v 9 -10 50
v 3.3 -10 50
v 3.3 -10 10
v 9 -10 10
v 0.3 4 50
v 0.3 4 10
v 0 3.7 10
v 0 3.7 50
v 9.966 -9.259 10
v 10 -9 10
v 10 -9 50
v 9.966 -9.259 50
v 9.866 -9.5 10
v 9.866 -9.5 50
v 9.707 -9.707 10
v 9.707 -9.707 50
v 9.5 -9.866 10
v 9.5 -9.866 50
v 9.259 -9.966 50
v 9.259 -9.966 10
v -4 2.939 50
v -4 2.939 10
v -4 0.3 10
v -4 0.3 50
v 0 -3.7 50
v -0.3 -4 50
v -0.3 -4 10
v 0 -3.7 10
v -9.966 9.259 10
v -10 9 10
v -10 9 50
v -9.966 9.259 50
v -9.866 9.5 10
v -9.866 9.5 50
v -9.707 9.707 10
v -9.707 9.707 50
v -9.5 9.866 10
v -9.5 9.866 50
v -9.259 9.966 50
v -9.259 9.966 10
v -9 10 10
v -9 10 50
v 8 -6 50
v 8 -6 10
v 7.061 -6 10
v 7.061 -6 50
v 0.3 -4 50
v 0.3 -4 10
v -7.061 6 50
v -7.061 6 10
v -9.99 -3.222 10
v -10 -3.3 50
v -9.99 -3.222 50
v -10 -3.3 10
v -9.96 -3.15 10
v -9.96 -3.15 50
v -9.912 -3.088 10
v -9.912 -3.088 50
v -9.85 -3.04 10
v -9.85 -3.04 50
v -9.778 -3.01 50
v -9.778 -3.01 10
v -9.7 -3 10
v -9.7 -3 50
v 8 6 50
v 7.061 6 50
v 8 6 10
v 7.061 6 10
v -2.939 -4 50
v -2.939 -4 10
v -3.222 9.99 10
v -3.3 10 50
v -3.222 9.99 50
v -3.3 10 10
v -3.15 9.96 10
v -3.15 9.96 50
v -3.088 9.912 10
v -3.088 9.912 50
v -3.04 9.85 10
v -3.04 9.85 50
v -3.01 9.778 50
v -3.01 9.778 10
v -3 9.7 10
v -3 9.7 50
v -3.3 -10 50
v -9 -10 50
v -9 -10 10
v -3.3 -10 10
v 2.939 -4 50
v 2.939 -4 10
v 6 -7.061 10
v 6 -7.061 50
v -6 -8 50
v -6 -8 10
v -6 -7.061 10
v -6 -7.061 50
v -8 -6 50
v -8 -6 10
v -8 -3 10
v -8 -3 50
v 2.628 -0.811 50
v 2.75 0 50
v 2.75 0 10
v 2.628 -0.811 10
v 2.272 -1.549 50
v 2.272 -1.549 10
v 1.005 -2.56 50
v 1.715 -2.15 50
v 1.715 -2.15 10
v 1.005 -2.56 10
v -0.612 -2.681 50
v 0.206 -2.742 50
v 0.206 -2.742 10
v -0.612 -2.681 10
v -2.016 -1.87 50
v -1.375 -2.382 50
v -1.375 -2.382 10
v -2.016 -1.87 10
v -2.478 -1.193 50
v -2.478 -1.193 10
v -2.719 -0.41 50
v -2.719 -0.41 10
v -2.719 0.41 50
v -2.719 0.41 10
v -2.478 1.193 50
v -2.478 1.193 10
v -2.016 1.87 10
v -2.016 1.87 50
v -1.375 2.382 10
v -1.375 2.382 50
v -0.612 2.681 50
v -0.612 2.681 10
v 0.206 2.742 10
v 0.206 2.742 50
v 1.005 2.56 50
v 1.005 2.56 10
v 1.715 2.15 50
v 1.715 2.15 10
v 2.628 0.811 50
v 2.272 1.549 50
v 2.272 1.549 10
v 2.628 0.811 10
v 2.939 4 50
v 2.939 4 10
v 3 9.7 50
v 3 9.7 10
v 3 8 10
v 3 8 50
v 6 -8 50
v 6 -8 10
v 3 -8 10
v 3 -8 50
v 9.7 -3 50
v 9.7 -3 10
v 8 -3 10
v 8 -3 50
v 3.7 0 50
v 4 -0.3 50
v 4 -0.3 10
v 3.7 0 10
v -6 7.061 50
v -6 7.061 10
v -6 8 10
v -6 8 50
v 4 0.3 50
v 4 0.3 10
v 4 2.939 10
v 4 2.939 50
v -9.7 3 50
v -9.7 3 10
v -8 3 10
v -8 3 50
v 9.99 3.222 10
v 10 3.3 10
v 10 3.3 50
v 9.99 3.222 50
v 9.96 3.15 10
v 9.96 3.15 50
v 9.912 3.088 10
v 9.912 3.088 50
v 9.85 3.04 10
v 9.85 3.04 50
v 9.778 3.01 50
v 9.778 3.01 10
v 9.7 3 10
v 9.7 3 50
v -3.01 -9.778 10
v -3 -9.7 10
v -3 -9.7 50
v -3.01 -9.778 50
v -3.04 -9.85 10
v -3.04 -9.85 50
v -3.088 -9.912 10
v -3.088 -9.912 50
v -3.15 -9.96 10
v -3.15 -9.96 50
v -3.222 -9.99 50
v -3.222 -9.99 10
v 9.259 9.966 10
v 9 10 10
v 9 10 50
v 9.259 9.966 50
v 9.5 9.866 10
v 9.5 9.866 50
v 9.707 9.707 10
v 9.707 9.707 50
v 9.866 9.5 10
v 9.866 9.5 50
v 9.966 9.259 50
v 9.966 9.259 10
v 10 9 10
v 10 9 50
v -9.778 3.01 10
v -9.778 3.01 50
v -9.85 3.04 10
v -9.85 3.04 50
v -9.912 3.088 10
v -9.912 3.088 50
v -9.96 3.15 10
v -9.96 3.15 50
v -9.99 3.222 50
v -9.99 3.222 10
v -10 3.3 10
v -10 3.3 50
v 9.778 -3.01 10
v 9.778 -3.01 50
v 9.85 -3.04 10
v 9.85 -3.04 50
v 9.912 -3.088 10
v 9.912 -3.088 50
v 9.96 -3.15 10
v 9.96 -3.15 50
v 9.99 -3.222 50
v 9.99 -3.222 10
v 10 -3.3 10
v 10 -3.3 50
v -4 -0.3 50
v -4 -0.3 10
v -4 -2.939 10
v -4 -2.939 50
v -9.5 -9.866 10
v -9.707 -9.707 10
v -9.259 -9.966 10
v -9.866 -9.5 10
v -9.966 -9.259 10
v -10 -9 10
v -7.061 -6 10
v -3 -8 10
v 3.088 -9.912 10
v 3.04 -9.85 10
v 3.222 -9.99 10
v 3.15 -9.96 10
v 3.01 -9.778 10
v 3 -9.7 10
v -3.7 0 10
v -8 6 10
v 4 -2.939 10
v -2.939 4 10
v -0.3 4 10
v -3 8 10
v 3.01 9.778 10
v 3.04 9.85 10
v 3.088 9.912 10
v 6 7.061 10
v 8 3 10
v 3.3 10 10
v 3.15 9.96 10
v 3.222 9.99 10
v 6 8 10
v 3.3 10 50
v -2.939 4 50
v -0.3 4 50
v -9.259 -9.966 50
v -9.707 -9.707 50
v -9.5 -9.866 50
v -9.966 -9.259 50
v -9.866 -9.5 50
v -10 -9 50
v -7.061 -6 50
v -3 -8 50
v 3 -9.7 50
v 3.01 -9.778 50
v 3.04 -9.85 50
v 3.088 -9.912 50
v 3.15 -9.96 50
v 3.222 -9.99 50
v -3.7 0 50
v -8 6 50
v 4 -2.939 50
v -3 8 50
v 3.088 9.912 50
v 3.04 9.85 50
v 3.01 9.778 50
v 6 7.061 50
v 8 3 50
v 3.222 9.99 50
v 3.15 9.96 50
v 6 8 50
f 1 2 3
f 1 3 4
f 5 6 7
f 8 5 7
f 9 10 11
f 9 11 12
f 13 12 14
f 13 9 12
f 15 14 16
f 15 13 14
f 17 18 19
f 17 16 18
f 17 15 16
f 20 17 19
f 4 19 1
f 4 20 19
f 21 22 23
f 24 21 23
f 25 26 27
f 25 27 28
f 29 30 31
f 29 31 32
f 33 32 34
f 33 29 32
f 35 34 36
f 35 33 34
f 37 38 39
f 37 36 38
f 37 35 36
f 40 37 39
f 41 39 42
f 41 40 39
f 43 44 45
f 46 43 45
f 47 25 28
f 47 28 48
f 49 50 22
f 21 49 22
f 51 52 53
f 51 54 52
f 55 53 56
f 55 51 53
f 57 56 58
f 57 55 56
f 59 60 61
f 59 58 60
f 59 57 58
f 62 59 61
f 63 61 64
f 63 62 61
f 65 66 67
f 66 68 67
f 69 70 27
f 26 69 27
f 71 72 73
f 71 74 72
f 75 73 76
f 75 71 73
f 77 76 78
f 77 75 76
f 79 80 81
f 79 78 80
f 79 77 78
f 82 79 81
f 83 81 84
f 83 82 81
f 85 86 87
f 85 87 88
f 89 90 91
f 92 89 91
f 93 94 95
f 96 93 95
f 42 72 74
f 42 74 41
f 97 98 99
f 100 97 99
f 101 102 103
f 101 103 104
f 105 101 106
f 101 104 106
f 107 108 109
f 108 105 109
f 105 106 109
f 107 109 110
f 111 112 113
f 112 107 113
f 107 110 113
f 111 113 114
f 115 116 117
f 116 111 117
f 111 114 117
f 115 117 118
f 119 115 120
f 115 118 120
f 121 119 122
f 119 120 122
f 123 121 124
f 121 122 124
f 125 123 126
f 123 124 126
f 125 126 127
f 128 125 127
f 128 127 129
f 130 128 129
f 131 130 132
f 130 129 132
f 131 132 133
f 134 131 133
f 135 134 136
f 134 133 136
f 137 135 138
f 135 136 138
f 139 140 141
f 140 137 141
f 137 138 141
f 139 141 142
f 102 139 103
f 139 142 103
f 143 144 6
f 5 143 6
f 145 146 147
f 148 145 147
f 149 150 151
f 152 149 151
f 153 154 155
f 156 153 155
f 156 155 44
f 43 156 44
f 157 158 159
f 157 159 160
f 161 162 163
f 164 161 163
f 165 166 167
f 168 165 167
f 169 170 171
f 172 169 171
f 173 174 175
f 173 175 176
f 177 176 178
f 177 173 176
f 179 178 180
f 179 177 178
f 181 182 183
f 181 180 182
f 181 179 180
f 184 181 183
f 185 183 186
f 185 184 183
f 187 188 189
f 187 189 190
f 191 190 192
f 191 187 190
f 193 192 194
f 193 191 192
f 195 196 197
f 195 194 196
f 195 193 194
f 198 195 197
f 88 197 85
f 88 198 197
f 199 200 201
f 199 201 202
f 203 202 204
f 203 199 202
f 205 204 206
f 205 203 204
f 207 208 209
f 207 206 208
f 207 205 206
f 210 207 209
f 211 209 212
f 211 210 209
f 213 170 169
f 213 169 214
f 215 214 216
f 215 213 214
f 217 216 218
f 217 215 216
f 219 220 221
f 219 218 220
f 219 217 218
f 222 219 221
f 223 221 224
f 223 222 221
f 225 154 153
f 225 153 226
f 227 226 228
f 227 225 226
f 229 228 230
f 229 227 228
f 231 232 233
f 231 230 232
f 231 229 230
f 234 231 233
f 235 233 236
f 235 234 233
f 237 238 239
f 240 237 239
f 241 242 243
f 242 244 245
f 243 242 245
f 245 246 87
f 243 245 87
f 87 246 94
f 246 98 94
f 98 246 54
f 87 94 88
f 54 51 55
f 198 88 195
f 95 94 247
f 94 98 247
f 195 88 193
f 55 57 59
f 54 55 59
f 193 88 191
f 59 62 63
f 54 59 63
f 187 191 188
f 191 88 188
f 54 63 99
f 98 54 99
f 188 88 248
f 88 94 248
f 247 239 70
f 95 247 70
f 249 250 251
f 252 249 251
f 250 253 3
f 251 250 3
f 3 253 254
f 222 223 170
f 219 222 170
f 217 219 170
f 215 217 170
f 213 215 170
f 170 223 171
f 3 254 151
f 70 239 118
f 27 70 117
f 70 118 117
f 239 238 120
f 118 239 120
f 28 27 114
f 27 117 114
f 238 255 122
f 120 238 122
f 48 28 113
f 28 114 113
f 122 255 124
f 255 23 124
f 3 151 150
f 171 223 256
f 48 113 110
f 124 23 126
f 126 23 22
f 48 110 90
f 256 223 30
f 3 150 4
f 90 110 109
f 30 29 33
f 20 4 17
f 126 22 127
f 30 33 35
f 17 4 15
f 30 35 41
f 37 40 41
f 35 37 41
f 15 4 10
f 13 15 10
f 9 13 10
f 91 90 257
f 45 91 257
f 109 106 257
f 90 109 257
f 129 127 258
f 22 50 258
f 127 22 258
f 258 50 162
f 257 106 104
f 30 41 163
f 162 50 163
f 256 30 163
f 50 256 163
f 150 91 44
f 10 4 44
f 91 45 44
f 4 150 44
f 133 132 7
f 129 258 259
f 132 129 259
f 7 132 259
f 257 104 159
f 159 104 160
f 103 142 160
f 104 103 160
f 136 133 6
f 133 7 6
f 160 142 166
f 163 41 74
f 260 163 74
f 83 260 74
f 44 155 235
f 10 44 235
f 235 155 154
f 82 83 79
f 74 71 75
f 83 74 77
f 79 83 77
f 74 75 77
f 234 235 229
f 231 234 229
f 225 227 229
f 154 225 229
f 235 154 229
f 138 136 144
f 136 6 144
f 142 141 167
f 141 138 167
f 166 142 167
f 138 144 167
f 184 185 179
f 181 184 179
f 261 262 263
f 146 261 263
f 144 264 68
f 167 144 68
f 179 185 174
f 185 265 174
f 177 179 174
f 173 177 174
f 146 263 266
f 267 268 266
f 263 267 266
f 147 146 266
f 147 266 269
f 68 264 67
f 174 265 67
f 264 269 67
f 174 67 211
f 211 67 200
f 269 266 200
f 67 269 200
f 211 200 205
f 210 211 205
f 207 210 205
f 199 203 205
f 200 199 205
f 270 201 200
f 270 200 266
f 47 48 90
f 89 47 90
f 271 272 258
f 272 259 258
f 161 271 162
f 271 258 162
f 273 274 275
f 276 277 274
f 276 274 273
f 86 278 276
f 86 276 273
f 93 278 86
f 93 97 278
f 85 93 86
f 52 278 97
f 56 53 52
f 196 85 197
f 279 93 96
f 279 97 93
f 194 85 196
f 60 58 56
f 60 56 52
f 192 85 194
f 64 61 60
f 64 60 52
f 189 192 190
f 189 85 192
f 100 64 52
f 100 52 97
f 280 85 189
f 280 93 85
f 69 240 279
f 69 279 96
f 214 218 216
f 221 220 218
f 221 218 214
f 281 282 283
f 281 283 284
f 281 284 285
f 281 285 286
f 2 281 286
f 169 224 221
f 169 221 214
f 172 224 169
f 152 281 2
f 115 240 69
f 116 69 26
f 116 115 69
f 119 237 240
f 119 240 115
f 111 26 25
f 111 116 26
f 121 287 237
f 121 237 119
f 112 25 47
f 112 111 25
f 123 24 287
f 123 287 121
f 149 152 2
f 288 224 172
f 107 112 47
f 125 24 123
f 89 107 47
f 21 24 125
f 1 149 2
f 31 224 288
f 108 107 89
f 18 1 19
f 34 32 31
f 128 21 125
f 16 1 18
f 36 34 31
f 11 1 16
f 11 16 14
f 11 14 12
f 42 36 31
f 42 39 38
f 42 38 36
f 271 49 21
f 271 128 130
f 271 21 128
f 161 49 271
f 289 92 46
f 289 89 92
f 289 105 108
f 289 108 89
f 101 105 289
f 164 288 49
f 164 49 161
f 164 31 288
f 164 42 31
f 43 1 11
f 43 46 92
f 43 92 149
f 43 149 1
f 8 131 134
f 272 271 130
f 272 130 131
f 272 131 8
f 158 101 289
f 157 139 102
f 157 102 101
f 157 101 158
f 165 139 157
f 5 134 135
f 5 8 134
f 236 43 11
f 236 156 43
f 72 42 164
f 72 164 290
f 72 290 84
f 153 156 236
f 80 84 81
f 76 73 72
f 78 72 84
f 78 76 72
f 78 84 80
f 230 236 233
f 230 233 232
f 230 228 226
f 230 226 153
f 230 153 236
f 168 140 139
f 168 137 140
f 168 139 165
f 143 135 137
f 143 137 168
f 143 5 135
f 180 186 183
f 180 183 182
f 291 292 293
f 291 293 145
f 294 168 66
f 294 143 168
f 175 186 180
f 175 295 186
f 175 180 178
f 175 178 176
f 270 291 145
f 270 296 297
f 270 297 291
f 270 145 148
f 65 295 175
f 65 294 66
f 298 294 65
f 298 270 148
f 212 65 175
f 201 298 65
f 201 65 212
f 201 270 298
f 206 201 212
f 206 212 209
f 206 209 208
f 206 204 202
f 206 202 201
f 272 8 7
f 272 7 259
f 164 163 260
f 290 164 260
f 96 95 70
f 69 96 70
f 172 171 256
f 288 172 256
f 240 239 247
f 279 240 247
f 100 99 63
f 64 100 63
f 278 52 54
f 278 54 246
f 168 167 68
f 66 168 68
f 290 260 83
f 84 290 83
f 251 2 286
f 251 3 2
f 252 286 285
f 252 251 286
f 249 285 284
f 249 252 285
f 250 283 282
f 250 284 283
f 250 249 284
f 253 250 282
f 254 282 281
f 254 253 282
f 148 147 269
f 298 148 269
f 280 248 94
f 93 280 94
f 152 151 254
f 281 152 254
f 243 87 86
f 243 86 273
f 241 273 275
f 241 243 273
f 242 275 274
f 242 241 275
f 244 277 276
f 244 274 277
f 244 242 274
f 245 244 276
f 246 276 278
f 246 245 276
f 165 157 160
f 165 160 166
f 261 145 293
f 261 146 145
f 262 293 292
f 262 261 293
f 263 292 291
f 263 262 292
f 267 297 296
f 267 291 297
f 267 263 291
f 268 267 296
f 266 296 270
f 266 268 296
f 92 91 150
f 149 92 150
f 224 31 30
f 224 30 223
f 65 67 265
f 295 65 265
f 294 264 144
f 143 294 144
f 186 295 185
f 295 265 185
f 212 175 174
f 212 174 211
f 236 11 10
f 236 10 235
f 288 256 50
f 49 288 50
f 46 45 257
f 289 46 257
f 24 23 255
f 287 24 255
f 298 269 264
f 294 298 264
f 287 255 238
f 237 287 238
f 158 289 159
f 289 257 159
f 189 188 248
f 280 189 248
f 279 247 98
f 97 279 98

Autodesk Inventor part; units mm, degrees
ref_plane "Startebene" through (0, 0, 0) normal (0, 0, 1) x (1, 0, 0)
ref_plane "Endebene" through (0, 0, 320) normal (0, 0, 1) x (1, 0, 0)
ref_plane "Startebene1" through (0, 0, 0) normal (0, 0, 1) x (1, 0, 0)
ref_plane "Endebene1" through (0, 0, 60) normal (0, 0, 1) x (1, 0, 0)
ref_plane "Startebene2" through (0, 0, 10) normal (0, 0, 1) x (1, 0, 0)
ref_plane "Endebene2" through (0, 0, 50) normal (0, 0, 1) x (1, 0, 0)
sketch "Skizze" plane through (0, 0, 0) normal (0, 0, 1) x (1, 0, 0)
  line L0 (-10, 9) -> (-10, 3.3)
  arc A0 (-10, 3.3) -> (-9.7, 3) centre (-9.7, 3.3) ccw
  line L1 (-9.7, 3) -> (-8, 3)
  line L2 (-8, 3) -> (-8, 6)
  line L3 (-8, 6) -> (-7.0607, 6)
  line L4 (-7.0607, 6) -> (-4, 2.9393)
  line L5 (-4, 2.9393) -> (-4, 0.3)
  line L6 (-4, 0.3) -> (-3.7, 0)
  line L7 (-3.7, 0) -> (-4, -0.3)
  line L8 (-4, -0.3) -> (-4, -2.9393)
  line L9 (-4, -2.9393) -> (-7.0607, -6)
  line L10 (-7.0607, -6) -> (-8, -6)
  line L11 (-8, -6) -> (-8, -3)
  line L12 (-8, -3) -> (-9.7, -3)
  arc A1 (-9.7, -3) -> (-10, -3.3) centre (-9.7, -3.3) ccw
  line L13 (-10, -3.3) -> (-10, -9)
  arc A2 (-10, -9) -> (-9, -10) centre (-9, -9) ccw
  line L14 (-9, -10) -> (-3.3, -10)
  arc A3 (-3.3, -10) -> (-3, -9.7) centre (-3.3, -9.7) ccw
  line L15 (-3, -9.7) -> (-3, -8)
  line L16 (-3, -8) -> (-6, -8)
  line L17 (-6, -8) -> (-6, -7.0607)
  line L18 (-6, -7.0607) -> (-2.9393, -4)
  line L19 (-2.9393, -4) -> (-0.3, -4)
  line L20 (-0.3, -4) -> (0, -3.7)
  line L21 (0, -3.7) -> (0.3, -4)
  line L22 (0.3, -4) -> (2.9393, -4)
  line L23 (2.9393, -4) -> (6, -7.0607)
  line L24 (6, -7.0607) -> (6, -8)
  line L25 (6, -8) -> (3, -8)
  line L26 (3, -8) -> (3, -9.7)
  arc A4 (3, -9.7) -> (3.3, -10) centre (3.3, -9.7) ccw
  line L27 (3.3, -10) -> (9, -10)
  arc A5 (9, -10) -> (10, -9) centre (9, -9) ccw
  line L28 (10, -9) -> (10, -3.3)
  arc A6 (10, -3.3) -> (9.7, -3) centre (9.7, -3.3) ccw
  line L29 (9.7, -3) -> (8, -3)
  line L30 (8, -3) -> (8, -6)
  line L31 (8, -6) -> (7.0607, -6)
  line L32 (7.0607, -6) -> (4, -2.9393)
  line L33 (4, -2.9393) -> (4, -0.3)
  line L34 (4, -0.3) -> (3.7, 0)
  line L35 (3.7, 0) -> (4, 0.3)
  line L36 (4, 0.3) -> (4, 2.9393)
  line L37 (4, 2.9393) -> (7.0607, 6)
  line L38 (7.0607, 6) -> (8, 6)
  line L39 (8, 6) -> (8, 3)
  line L40 (8, 3) -> (9.7, 3)
  arc A7 (9.7, 3) -> (10, 3.3) centre (9.7, 3.3) ccw
  line L41 (10, 3.3) -> (10, 9)
  arc A8 (10, 9) -> (9, 10) centre (9, 9) ccw
  line L42 (9, 10) -> (3.3, 10)
  arc A9 (3.3, 10) -> (3, 9.7) centre (3.3, 9.7) ccw
  line L43 (3, 9.7) -> (3, 8)
  line L44 (3, 8) -> (6, 8)
  line L45 (6, 8) -> (6, 7.0607)
  line L46 (6, 7.0607) -> (2.9393, 4)
  line L47 (2.9393, 4) -> (0.3, 4)
  line L48 (0.3, 4) -> (0, 3.7)
  line L49 (0, 3.7) -> (-0.3, 4)
  line L50 (-0.3, 4) -> (-2.9393, 4)
  line L51 (-2.9393, 4) -> (-6, 7.0607)
  line L52 (-6, 7.0607) -> (-6, 8)
  line L53 (-6, 8) -> (-3, 8)
  line L54 (-3, 8) -> (-3, 9.7)
  arc A10 (-3, 9.7) -> (-3.3, 10) centre (-3.3, 9.7) ccw
  line L55 (-3.3, 10) -> (-9, 10)
  arc A11 (-9, 10) -> (-10, 9) centre (-9, 9) ccw
  circle A12 centre (0, 0) radius 2.75
  dimension "d2" = 5.5
  dimension "d3" = 10
  dimension "d4" = 10
  dimension "d5" = 5.7
  dimension "d6" = 5.7
  dimension "d7" = 1.7
  dimension "d8" = 3
  dimension "d9" = 0.3
  dimension "d10" = 90
  dimension "d11" = 45
  dimension "d12" = 45
  dimension "d13" = 45
  dimension "d14" = 90
  dimension "d15" = 90
  dimension "d16" = 45
  dimension "d17" = 45
  dimension "d18" = 45
  dimension "d19" = 45
  dimension "d20" = 90
  dimension "d21" = 90
  dimension "d22" = 45
  dimension "d23" = 45
  dimension "d24" = 90
  dimension "d25" = 90
  dimension "d26" = 90
  dimension "d27" = 90
  dimension "d28" = 90
  dimension "d29" = 90
  dimension "d30" = 90
  dimension "d31" = 90
  dimension "d32" = 90
  dimension "d33" = 90
  dimension "d34" = 90
  dimension "d35" = 90
  dimension "d36" = 90
  dimension "d37" = 90
  dimension "d38" = 90
  dimension "d39" = 4
  dimension "d40" = 6
  dimension "d41" = 13
  dimension "d42" = 14
  dimension "d43" = 16
  dimension "d44" = 18
  dimension "d45" = 3
  dimension "d46" = 9
  dimension "d47" = 7
  dimension "d48" = 1
  dimension "d49" = 7
  dimension "d50" = 1.5
  dimension "d51" = 1.8663
  dimension "d52" = 3.3663
  dimension "d53" = 1.5
  dimension "d54" = 1.8663
  dimension "d55" = 3.3663
  dimension "d56" = 4
  dimension "d57" = 10.8187
  dimension "d58" = 1.9092
  dimension "d59" = 5
  dimension "d60" = 13
  dimension "d61" = 13
  dimension "d62" = 16.0513
  dimension "d63" = 3.3234
  dimension "d64" = 14
  dimension "d65" = 12.685
extrude "Körper" add sketch "Skizze" along normal up to surface (40 mm away) from surface at 10
sketch "Skizze13" plane through (0, 0, 0) normal (0, 0, 1) x (1, 0, 0)
  line L0 (0, 0) -> (10, 0)
ref_plane "Arbeitsebene12" through (0, 0, 0) normal (0, -1, 0) x (1, 0, 0)
sketch "Skizze14" plane through (0, 0, 0) normal (0, -1, 0) x (1, 0, 0)
  line L0 (-2, 10) -> (12, 10)
  line L1 (-2, 50) -> (12, 50)
  dimension "d80" = 40
ref_plane "Arbeitsebene13" through (-9, 0, 10) normal (0, 0, -1) x (-1, 0, 0)
split "Trennen1" plane through (-9, 0, 10) removes the side toward (0, 0, -1)
ref_plane "Arbeitsebene14" through (-9, 50, 50) normal (0, 0, 1) x (1, 0, 0)
split "Trennen2" plane through (-9, 50, 50) removes the side toward (0, 0, 1)
equation "\"G_OFFSET_START\" = 0"
equation "\"G_OFFSET_END\" = 0"
equation "\"G_L\" = d80"
equation "\"G_OFFSET_START1\" = 0"
equation "\"G_OFFSET_END1\" = 0"
properties part number "Alu Profil 20x20 - AP2020" material "Aluminium 6061"
